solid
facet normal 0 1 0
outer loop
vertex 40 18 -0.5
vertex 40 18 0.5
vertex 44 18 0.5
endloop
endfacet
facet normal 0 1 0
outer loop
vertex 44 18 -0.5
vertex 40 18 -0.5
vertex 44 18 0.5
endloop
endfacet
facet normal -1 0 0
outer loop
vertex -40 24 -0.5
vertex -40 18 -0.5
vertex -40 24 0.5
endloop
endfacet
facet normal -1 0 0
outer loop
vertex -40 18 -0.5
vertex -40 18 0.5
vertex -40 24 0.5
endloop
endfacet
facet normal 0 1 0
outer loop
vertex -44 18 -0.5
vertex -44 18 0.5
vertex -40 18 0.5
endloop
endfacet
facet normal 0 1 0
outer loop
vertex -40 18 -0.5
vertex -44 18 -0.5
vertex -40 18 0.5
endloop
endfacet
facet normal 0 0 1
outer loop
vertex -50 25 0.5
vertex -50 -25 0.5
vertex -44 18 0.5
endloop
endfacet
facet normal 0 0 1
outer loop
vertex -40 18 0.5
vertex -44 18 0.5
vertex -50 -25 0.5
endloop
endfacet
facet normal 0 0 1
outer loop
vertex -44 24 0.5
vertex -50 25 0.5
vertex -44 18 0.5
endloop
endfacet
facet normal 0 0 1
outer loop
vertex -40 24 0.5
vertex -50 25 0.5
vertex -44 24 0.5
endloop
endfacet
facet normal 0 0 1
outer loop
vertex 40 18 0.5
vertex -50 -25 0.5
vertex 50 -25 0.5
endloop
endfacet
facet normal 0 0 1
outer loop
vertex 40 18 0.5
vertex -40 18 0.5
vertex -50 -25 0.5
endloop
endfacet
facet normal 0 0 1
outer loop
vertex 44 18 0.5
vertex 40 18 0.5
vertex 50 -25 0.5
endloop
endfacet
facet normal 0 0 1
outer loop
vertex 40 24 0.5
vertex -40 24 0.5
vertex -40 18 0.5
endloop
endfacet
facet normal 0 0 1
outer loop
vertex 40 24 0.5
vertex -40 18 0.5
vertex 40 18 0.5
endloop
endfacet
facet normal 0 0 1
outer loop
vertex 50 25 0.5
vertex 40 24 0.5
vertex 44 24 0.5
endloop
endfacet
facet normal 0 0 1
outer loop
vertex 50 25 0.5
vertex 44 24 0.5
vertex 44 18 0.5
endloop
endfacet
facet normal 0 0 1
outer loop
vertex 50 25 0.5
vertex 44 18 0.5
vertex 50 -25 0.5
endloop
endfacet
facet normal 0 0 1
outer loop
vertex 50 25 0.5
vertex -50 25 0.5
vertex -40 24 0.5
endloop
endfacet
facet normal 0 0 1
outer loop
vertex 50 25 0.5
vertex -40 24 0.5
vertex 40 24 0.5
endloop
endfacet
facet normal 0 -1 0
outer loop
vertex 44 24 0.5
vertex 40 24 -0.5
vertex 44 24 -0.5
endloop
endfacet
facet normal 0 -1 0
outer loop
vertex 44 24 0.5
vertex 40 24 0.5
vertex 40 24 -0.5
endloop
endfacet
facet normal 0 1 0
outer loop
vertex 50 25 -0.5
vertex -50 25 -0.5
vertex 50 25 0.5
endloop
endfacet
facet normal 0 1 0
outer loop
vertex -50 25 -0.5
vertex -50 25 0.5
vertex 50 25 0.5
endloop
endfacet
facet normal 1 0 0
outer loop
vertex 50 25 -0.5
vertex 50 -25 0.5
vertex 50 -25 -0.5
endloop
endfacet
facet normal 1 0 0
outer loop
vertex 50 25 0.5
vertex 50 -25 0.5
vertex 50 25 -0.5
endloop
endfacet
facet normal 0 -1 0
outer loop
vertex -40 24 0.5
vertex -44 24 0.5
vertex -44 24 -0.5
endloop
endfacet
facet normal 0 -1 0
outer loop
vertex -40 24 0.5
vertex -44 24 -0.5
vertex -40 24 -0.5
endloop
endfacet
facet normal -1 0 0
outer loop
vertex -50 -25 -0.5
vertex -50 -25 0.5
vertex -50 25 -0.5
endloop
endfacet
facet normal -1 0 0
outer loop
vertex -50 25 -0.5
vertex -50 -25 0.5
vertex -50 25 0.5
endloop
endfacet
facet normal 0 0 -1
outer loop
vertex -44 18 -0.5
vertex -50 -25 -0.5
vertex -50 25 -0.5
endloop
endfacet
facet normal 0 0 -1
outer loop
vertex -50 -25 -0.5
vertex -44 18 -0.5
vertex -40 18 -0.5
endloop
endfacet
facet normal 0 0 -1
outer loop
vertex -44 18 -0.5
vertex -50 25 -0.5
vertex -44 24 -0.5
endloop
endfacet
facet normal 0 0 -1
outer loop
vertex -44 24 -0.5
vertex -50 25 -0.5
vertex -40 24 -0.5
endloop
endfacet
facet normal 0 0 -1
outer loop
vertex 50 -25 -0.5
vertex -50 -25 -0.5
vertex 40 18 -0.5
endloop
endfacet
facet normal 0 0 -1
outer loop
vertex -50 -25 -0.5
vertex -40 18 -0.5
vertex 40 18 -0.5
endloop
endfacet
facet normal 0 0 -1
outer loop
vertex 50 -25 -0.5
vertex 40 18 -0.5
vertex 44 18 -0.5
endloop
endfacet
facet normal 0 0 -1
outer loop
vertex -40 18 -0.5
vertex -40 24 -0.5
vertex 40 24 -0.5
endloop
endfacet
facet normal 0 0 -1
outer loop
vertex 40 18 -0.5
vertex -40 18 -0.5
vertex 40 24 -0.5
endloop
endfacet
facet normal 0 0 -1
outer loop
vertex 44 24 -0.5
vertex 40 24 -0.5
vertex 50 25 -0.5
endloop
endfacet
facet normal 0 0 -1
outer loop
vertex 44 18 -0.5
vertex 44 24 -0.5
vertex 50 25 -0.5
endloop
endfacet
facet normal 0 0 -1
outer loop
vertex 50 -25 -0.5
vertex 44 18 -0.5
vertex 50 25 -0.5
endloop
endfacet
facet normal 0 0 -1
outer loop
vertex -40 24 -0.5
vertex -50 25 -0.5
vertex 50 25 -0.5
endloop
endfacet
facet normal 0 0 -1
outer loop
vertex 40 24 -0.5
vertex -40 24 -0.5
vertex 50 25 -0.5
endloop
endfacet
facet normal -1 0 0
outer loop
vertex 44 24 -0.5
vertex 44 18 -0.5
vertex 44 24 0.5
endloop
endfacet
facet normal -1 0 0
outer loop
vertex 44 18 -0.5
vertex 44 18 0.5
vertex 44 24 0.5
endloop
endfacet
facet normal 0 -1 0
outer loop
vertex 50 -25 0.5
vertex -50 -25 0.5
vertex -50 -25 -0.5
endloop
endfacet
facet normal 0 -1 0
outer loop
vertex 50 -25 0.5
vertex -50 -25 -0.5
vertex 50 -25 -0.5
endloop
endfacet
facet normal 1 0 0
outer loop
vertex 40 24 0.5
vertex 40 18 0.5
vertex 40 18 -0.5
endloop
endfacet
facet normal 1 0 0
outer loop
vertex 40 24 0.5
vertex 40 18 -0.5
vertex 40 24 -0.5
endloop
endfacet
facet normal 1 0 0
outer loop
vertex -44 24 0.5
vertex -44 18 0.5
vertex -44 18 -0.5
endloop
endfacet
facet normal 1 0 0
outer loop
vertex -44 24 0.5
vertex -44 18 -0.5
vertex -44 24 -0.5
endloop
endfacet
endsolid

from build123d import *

# Parameters (mm, degrees)
SKETCH_1_W      = 100
SKETCH_1_H      = 50
SKETCH_1_W_2    = 4
SKETCH_1_H_2    = 6
EXTRUDE_1_DEPTH = 0.5


with BuildPart() as part:
    # 草圖1 → 填料-伸長1 (new, symmetric)
    with BuildSketch(Plane.XY):
        Rectangle(SKETCH_1_W, SKETCH_1_H)
        with Locations((-42, 21)):
            Rectangle(SKETCH_1_W_2, SKETCH_1_H_2, mode=Mode.SUBTRACT)
        with Locations((42, 21)):
            Rectangle(SKETCH_1_W_2, SKETCH_1_H_2, mode=Mode.SUBTRACT)
    extrude(amount=EXTRUDE_1_DEPTH, both=True)


solid = part.part
